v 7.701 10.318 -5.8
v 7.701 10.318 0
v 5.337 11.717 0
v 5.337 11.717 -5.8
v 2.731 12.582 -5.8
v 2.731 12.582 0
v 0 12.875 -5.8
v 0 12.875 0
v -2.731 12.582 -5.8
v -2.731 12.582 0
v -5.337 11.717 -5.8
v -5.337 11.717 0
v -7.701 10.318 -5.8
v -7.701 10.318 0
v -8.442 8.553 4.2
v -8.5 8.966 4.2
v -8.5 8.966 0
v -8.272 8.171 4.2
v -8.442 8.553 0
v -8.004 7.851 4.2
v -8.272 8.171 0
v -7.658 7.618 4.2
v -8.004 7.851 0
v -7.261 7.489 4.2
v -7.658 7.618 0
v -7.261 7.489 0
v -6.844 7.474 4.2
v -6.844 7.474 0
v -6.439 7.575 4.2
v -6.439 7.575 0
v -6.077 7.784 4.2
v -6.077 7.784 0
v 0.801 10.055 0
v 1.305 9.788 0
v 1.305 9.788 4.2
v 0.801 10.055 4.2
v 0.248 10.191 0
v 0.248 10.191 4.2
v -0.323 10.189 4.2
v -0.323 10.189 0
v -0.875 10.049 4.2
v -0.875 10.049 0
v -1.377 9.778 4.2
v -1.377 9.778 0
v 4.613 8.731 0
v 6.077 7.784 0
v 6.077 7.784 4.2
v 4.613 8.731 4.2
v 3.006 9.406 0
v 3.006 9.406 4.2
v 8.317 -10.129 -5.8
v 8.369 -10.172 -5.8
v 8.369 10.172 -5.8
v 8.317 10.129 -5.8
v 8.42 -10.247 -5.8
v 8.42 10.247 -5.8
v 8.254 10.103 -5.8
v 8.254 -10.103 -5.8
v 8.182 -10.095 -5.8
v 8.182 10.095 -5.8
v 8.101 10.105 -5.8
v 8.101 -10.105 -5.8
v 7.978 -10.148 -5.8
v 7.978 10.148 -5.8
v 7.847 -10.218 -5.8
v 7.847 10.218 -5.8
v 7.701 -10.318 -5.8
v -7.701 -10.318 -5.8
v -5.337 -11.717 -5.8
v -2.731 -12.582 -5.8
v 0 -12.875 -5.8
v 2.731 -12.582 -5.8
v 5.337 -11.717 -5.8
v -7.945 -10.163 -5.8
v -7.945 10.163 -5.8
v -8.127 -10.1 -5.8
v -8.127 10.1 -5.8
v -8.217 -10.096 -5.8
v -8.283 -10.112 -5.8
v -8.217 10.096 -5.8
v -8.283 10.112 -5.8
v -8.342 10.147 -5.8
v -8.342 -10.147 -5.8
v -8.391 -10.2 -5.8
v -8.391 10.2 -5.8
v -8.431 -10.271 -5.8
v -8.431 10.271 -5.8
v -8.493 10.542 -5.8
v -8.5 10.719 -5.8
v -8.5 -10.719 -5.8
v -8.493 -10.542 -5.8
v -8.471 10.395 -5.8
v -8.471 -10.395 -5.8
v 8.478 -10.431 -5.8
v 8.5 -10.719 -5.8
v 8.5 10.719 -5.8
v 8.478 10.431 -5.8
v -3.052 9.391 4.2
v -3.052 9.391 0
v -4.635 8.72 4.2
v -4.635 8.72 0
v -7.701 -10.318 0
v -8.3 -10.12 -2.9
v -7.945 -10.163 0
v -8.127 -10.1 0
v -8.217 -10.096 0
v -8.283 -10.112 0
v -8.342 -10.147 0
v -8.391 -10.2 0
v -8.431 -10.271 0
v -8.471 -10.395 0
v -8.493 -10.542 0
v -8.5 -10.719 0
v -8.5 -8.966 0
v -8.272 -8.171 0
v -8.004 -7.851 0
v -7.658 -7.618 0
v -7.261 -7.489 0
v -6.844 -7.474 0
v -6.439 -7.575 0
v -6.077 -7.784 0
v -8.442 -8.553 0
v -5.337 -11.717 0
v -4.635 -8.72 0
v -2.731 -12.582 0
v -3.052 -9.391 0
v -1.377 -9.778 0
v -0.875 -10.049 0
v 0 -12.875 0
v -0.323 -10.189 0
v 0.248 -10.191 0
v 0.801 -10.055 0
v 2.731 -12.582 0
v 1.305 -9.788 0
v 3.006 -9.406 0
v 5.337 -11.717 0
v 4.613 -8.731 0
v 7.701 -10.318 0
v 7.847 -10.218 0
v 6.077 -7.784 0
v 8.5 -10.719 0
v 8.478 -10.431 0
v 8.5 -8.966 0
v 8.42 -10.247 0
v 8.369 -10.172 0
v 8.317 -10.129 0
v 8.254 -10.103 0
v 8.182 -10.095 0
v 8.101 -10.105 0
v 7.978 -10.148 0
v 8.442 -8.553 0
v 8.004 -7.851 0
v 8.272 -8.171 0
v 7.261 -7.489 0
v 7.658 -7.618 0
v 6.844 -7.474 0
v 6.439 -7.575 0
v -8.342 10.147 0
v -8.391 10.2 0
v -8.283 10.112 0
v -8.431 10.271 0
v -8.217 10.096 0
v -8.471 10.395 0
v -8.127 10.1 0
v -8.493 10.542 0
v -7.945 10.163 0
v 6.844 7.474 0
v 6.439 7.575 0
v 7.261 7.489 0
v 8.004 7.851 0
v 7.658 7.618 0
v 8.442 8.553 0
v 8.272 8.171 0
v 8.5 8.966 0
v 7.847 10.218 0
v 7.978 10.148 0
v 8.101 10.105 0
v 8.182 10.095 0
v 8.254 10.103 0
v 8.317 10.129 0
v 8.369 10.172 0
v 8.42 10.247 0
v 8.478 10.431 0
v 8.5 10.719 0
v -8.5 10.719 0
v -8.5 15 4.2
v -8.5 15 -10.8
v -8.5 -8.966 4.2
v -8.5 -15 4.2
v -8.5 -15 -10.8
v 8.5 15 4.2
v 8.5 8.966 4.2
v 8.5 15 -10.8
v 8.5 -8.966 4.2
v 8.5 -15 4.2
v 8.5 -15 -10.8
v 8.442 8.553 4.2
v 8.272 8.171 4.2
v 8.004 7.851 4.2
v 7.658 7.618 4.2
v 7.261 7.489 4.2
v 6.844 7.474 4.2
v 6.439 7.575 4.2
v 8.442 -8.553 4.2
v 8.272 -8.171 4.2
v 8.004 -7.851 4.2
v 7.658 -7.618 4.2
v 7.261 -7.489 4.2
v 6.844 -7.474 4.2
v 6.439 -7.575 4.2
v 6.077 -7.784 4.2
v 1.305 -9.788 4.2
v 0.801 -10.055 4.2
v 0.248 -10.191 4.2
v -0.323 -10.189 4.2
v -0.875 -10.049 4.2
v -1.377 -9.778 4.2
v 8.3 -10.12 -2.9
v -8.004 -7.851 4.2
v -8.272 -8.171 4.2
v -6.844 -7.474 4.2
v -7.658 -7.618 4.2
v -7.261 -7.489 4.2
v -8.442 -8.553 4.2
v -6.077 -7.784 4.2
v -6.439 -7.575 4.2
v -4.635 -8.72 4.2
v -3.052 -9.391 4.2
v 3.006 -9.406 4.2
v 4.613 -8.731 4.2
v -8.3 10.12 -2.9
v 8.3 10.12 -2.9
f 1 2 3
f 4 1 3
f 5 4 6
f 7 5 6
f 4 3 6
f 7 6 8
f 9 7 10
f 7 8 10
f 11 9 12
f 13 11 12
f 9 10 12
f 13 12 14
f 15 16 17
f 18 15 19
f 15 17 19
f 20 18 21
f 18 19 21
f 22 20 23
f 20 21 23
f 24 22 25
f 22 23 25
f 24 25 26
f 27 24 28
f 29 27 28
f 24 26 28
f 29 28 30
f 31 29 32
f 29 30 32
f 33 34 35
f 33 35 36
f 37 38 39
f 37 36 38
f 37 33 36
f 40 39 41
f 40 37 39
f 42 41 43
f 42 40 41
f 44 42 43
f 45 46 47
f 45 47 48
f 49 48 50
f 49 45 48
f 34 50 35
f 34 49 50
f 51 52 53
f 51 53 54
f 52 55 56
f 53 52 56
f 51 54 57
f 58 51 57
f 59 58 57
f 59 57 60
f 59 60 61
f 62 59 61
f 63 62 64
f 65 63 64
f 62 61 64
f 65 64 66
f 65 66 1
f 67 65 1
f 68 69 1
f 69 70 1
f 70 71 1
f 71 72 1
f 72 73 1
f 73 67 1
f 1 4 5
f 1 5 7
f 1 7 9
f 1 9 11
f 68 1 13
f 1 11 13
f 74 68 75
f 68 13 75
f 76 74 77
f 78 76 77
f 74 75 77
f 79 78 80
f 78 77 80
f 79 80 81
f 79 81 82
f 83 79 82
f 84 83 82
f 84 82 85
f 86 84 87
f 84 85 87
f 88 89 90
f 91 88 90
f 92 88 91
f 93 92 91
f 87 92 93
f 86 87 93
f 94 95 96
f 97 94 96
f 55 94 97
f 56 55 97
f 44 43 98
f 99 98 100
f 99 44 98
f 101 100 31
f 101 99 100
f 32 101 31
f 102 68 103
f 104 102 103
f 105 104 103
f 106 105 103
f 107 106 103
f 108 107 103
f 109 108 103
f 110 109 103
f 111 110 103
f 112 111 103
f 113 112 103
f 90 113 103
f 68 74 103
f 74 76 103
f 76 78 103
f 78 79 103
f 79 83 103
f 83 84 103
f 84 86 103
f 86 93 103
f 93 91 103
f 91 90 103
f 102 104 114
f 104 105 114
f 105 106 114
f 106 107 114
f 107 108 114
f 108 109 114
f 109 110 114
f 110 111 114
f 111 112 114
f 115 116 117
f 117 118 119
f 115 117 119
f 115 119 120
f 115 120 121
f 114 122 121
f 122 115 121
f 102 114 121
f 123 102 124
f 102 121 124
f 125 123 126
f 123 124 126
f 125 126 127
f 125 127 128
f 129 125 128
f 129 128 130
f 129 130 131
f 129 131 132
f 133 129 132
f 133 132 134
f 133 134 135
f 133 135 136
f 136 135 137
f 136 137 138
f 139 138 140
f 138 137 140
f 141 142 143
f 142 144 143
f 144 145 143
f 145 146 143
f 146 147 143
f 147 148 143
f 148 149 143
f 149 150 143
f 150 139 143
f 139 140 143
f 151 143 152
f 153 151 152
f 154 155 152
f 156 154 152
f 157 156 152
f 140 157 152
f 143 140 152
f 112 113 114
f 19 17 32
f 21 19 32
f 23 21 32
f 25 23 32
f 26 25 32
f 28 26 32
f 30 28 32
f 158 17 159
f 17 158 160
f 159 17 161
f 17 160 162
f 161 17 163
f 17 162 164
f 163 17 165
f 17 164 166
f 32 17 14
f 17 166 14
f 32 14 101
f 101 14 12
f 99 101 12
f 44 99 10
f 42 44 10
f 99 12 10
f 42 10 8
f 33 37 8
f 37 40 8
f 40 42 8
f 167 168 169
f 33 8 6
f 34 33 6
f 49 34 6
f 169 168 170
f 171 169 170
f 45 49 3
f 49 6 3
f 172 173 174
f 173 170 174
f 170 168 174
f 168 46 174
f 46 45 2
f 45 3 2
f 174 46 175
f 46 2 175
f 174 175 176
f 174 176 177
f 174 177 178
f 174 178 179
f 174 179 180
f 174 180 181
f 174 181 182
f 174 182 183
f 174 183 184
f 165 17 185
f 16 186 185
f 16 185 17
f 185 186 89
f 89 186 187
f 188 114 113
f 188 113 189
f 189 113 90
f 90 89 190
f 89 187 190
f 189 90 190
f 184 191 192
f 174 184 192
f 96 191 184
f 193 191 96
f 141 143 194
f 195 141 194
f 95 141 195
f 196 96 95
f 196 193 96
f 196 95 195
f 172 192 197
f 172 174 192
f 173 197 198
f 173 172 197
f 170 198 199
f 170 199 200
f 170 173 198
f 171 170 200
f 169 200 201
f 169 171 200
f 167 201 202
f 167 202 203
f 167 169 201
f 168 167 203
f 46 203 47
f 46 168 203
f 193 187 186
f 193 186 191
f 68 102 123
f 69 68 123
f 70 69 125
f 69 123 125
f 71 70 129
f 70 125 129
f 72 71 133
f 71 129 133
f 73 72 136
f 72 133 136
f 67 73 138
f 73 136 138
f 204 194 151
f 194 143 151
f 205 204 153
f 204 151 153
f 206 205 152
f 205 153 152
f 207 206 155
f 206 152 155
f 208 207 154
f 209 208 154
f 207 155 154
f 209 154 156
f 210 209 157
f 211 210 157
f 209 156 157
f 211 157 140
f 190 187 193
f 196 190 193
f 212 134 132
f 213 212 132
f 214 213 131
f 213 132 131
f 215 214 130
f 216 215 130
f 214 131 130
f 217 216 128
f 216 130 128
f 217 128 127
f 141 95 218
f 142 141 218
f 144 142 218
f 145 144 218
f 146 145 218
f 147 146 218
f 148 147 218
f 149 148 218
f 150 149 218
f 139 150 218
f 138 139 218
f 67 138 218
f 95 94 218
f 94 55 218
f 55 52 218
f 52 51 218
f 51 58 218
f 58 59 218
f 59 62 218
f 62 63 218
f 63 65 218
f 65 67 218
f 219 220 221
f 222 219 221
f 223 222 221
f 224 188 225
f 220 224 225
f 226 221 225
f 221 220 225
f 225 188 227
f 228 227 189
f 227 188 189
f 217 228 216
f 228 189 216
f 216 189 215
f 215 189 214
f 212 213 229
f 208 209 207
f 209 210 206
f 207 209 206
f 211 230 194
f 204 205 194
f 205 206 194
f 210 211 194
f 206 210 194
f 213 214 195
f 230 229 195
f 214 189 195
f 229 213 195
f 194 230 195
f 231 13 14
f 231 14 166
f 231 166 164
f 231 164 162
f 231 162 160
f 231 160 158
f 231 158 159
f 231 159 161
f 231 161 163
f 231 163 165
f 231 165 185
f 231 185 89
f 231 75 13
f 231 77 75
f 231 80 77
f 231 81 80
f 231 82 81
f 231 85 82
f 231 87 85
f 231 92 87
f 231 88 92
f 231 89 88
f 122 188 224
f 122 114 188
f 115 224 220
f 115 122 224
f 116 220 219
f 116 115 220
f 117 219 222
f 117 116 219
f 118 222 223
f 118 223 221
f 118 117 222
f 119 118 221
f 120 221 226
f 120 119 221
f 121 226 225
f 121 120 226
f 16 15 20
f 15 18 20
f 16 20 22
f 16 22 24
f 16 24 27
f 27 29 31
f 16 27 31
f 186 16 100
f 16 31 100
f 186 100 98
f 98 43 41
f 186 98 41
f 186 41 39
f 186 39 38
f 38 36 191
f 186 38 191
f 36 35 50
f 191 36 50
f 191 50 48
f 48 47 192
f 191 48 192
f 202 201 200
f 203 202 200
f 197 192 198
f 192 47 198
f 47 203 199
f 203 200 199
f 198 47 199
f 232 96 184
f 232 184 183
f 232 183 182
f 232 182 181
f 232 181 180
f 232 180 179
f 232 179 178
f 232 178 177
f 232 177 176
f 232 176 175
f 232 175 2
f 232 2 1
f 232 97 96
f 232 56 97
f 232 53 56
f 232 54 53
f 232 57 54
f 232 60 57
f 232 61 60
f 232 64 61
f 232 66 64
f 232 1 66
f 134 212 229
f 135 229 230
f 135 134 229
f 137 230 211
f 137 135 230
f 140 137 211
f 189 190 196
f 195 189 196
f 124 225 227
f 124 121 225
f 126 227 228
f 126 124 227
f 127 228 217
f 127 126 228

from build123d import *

# Parameters (mm, degrees)
F0_R         = 12.875
F1_DEPTH     = 5.8
F2_R         = 9.875
F3_DEPTH     = 12
F5_DEPTH     = 5
F7_W         = 30
F7_H         = 30
F7_W_2       = 18
F7_H_2       = 27
F8_DEPTH     = 10
F15_W        = 17
F15_H        = 30
F16_DEPTH    = 15
F18_R        = 1.5
F19_T1_DEPTH = 5.8


# Not quite as in the source:
# - a fillet or chamfer that OpenCascade refuses, or shapes differently, is made with other operations: its cross-section is extruded or revolved along the edge and cut away or added
# - a feature names something its author has since deleted; it is built from what else it names


with BuildPart() as f1:
    # F0 (on Top) → F1 (new body)
    with BuildSketch(Plane.XY):
        Circle(F0_R)
    extrude(amount=-F1_DEPTH)

    # F2 (on Top) → F3 (join)
    with BuildSketch(Plane.XY):
        Circle(F2_R)
    extrude(amount=F3_DEPTH)


with BuildPart() as f5:
    # F4 (on Top) → F5 (new body)
    with BuildSketch(Plane.XY):
        with BuildLine():
            ThreePointArc((-2.19192449, 8.7487287819), (-0.0332522533, 9.0190732649), (2.1273547272, 8.7646534521))
            ThreePointArc((2.1273547272, 8.7646534521), (-0.0376344683, 10.2076699565), (-2.19192449, 8.7487287819))
        make_face()
    extrude(amount=F5_DEPTH)


with BuildPart() as f6_1:
    # F6: instance of F5
    add(f5.part.mirror(Plane.XZ))


with BuildPart() as f8:
    # F7 (on Top) → F8 (new body, symmetric)
    with BuildSketch(Plane.XY):
        Rectangle(F7_W, F7_H)
        Rectangle(F7_W_2, F7_H_2, mode=Mode.SUBTRACT)
    extrude(amount=F8_DEPTH, both=True)


with BuildPart() as f1_1:
    add(f1.part)

    # F9: cut F8
    add(f8.part, mode=Mode.SUBTRACT)


with BuildPart() as f16:
    # F15 (on face) → F16 (new body)
    with BuildSketch(Plane(origin=(0, 0, -10.8), x_dir=(1, 0, 0), z_dir=(0, 0, -1))):
        Rectangle(F15_W, F15_H)
    extrude(amount=-F16_DEPTH)

    # F17: cut F6_1, F5, F1
    add(f6_1.part, mode=Mode.SUBTRACT)
    add(f5.part, mode=Mode.SUBTRACT)
    add(f1_1.part, mode=Mode.SUBTRACT)

    # F18
    f18_edges = [f16.edges().sort_by_distance(p)[0] for p in [
        (8.5, -5.026492, 2.1),
        (8.5, 5.026492, 2.1),
        (-8.5, 5.026492, 2.1),
        (-8.5, -5.026492, 2.1),
    ]]
    fillet(f18_edges, radius=F18_R)

    # F19: fillet of radius 0.5 on 4 edges, made by hand

    # F19_s2 → F19_t1 (cut)
    with BuildSketch(Plane.XY.offset(-5.8)):
        with BuildLine():
            add(Edge.make_bspline(
                [(-7.7009345794, 10.3180052143), (-8.5, 9.7216156603), (-8.5, 10.718704446)],
                knots=[0, 0, 0, 1, 1, 1], degree=2, weights=[1, 1, 1]))
            Line((-8.5, 10.718704446), (-8.5, 9.6703477187))
            ThreePointArc((-8.5, 9.6703477187), (-8.106937484, 10.0021592484), (-7.7009345794, 10.3180052143))
        make_face()
        with BuildLine():
            add(Edge.make_bspline(
                [(-7.7009345794, -10.3180052143), (-8.5, -9.7216156603), (-8.5, -10.718704446)],
                knots=[0, 0, 0, 1, 1, 1], degree=2, weights=[1, 1, 1]))
            Line((-8.5, -10.718704446), (-8.5, -9.6703477187))
            ThreePointArc((-8.5, -9.6703477187), (-8.106937484, -10.0021592484), (-7.7009345794, -10.3180052143))
        make_face()
        with BuildLine():
            add(Edge.make_bspline(
                [(8.5, 10.718704446), (8.5, 9.7216156603), (7.7009345794, 10.3180052143)],
                knots=[0, 0, 0, 1, 1, 1], degree=2, weights=[1, 1, 1]))
            ThreePointArc((7.7009345794, 10.3180052143), (8.106937484, 10.0021592484), (8.5, 9.6703477187))
            Line((8.5, 9.6703477187), (8.5, 10.718704446))
        make_face()
        with BuildLine():
            add(Edge.make_bspline(
                [(8.5, -10.718704446), (8.5, -9.7216156603), (7.7009345794, -10.3180052143)],
                knots=[0, 0, 0, 1, 1, 1], degree=2, weights=[1, 1, 1]))
            ThreePointArc((7.7009345794, -10.3180052143), (8.106937484, -10.0021592484), (8.5, -9.6703477187))
            Line((8.5, -9.6703477187), (8.5, -10.718704446))
        make_face()
    extrude(amount=F19_T1_DEPTH, mode=Mode.SUBTRACT)


solid = f16.part
